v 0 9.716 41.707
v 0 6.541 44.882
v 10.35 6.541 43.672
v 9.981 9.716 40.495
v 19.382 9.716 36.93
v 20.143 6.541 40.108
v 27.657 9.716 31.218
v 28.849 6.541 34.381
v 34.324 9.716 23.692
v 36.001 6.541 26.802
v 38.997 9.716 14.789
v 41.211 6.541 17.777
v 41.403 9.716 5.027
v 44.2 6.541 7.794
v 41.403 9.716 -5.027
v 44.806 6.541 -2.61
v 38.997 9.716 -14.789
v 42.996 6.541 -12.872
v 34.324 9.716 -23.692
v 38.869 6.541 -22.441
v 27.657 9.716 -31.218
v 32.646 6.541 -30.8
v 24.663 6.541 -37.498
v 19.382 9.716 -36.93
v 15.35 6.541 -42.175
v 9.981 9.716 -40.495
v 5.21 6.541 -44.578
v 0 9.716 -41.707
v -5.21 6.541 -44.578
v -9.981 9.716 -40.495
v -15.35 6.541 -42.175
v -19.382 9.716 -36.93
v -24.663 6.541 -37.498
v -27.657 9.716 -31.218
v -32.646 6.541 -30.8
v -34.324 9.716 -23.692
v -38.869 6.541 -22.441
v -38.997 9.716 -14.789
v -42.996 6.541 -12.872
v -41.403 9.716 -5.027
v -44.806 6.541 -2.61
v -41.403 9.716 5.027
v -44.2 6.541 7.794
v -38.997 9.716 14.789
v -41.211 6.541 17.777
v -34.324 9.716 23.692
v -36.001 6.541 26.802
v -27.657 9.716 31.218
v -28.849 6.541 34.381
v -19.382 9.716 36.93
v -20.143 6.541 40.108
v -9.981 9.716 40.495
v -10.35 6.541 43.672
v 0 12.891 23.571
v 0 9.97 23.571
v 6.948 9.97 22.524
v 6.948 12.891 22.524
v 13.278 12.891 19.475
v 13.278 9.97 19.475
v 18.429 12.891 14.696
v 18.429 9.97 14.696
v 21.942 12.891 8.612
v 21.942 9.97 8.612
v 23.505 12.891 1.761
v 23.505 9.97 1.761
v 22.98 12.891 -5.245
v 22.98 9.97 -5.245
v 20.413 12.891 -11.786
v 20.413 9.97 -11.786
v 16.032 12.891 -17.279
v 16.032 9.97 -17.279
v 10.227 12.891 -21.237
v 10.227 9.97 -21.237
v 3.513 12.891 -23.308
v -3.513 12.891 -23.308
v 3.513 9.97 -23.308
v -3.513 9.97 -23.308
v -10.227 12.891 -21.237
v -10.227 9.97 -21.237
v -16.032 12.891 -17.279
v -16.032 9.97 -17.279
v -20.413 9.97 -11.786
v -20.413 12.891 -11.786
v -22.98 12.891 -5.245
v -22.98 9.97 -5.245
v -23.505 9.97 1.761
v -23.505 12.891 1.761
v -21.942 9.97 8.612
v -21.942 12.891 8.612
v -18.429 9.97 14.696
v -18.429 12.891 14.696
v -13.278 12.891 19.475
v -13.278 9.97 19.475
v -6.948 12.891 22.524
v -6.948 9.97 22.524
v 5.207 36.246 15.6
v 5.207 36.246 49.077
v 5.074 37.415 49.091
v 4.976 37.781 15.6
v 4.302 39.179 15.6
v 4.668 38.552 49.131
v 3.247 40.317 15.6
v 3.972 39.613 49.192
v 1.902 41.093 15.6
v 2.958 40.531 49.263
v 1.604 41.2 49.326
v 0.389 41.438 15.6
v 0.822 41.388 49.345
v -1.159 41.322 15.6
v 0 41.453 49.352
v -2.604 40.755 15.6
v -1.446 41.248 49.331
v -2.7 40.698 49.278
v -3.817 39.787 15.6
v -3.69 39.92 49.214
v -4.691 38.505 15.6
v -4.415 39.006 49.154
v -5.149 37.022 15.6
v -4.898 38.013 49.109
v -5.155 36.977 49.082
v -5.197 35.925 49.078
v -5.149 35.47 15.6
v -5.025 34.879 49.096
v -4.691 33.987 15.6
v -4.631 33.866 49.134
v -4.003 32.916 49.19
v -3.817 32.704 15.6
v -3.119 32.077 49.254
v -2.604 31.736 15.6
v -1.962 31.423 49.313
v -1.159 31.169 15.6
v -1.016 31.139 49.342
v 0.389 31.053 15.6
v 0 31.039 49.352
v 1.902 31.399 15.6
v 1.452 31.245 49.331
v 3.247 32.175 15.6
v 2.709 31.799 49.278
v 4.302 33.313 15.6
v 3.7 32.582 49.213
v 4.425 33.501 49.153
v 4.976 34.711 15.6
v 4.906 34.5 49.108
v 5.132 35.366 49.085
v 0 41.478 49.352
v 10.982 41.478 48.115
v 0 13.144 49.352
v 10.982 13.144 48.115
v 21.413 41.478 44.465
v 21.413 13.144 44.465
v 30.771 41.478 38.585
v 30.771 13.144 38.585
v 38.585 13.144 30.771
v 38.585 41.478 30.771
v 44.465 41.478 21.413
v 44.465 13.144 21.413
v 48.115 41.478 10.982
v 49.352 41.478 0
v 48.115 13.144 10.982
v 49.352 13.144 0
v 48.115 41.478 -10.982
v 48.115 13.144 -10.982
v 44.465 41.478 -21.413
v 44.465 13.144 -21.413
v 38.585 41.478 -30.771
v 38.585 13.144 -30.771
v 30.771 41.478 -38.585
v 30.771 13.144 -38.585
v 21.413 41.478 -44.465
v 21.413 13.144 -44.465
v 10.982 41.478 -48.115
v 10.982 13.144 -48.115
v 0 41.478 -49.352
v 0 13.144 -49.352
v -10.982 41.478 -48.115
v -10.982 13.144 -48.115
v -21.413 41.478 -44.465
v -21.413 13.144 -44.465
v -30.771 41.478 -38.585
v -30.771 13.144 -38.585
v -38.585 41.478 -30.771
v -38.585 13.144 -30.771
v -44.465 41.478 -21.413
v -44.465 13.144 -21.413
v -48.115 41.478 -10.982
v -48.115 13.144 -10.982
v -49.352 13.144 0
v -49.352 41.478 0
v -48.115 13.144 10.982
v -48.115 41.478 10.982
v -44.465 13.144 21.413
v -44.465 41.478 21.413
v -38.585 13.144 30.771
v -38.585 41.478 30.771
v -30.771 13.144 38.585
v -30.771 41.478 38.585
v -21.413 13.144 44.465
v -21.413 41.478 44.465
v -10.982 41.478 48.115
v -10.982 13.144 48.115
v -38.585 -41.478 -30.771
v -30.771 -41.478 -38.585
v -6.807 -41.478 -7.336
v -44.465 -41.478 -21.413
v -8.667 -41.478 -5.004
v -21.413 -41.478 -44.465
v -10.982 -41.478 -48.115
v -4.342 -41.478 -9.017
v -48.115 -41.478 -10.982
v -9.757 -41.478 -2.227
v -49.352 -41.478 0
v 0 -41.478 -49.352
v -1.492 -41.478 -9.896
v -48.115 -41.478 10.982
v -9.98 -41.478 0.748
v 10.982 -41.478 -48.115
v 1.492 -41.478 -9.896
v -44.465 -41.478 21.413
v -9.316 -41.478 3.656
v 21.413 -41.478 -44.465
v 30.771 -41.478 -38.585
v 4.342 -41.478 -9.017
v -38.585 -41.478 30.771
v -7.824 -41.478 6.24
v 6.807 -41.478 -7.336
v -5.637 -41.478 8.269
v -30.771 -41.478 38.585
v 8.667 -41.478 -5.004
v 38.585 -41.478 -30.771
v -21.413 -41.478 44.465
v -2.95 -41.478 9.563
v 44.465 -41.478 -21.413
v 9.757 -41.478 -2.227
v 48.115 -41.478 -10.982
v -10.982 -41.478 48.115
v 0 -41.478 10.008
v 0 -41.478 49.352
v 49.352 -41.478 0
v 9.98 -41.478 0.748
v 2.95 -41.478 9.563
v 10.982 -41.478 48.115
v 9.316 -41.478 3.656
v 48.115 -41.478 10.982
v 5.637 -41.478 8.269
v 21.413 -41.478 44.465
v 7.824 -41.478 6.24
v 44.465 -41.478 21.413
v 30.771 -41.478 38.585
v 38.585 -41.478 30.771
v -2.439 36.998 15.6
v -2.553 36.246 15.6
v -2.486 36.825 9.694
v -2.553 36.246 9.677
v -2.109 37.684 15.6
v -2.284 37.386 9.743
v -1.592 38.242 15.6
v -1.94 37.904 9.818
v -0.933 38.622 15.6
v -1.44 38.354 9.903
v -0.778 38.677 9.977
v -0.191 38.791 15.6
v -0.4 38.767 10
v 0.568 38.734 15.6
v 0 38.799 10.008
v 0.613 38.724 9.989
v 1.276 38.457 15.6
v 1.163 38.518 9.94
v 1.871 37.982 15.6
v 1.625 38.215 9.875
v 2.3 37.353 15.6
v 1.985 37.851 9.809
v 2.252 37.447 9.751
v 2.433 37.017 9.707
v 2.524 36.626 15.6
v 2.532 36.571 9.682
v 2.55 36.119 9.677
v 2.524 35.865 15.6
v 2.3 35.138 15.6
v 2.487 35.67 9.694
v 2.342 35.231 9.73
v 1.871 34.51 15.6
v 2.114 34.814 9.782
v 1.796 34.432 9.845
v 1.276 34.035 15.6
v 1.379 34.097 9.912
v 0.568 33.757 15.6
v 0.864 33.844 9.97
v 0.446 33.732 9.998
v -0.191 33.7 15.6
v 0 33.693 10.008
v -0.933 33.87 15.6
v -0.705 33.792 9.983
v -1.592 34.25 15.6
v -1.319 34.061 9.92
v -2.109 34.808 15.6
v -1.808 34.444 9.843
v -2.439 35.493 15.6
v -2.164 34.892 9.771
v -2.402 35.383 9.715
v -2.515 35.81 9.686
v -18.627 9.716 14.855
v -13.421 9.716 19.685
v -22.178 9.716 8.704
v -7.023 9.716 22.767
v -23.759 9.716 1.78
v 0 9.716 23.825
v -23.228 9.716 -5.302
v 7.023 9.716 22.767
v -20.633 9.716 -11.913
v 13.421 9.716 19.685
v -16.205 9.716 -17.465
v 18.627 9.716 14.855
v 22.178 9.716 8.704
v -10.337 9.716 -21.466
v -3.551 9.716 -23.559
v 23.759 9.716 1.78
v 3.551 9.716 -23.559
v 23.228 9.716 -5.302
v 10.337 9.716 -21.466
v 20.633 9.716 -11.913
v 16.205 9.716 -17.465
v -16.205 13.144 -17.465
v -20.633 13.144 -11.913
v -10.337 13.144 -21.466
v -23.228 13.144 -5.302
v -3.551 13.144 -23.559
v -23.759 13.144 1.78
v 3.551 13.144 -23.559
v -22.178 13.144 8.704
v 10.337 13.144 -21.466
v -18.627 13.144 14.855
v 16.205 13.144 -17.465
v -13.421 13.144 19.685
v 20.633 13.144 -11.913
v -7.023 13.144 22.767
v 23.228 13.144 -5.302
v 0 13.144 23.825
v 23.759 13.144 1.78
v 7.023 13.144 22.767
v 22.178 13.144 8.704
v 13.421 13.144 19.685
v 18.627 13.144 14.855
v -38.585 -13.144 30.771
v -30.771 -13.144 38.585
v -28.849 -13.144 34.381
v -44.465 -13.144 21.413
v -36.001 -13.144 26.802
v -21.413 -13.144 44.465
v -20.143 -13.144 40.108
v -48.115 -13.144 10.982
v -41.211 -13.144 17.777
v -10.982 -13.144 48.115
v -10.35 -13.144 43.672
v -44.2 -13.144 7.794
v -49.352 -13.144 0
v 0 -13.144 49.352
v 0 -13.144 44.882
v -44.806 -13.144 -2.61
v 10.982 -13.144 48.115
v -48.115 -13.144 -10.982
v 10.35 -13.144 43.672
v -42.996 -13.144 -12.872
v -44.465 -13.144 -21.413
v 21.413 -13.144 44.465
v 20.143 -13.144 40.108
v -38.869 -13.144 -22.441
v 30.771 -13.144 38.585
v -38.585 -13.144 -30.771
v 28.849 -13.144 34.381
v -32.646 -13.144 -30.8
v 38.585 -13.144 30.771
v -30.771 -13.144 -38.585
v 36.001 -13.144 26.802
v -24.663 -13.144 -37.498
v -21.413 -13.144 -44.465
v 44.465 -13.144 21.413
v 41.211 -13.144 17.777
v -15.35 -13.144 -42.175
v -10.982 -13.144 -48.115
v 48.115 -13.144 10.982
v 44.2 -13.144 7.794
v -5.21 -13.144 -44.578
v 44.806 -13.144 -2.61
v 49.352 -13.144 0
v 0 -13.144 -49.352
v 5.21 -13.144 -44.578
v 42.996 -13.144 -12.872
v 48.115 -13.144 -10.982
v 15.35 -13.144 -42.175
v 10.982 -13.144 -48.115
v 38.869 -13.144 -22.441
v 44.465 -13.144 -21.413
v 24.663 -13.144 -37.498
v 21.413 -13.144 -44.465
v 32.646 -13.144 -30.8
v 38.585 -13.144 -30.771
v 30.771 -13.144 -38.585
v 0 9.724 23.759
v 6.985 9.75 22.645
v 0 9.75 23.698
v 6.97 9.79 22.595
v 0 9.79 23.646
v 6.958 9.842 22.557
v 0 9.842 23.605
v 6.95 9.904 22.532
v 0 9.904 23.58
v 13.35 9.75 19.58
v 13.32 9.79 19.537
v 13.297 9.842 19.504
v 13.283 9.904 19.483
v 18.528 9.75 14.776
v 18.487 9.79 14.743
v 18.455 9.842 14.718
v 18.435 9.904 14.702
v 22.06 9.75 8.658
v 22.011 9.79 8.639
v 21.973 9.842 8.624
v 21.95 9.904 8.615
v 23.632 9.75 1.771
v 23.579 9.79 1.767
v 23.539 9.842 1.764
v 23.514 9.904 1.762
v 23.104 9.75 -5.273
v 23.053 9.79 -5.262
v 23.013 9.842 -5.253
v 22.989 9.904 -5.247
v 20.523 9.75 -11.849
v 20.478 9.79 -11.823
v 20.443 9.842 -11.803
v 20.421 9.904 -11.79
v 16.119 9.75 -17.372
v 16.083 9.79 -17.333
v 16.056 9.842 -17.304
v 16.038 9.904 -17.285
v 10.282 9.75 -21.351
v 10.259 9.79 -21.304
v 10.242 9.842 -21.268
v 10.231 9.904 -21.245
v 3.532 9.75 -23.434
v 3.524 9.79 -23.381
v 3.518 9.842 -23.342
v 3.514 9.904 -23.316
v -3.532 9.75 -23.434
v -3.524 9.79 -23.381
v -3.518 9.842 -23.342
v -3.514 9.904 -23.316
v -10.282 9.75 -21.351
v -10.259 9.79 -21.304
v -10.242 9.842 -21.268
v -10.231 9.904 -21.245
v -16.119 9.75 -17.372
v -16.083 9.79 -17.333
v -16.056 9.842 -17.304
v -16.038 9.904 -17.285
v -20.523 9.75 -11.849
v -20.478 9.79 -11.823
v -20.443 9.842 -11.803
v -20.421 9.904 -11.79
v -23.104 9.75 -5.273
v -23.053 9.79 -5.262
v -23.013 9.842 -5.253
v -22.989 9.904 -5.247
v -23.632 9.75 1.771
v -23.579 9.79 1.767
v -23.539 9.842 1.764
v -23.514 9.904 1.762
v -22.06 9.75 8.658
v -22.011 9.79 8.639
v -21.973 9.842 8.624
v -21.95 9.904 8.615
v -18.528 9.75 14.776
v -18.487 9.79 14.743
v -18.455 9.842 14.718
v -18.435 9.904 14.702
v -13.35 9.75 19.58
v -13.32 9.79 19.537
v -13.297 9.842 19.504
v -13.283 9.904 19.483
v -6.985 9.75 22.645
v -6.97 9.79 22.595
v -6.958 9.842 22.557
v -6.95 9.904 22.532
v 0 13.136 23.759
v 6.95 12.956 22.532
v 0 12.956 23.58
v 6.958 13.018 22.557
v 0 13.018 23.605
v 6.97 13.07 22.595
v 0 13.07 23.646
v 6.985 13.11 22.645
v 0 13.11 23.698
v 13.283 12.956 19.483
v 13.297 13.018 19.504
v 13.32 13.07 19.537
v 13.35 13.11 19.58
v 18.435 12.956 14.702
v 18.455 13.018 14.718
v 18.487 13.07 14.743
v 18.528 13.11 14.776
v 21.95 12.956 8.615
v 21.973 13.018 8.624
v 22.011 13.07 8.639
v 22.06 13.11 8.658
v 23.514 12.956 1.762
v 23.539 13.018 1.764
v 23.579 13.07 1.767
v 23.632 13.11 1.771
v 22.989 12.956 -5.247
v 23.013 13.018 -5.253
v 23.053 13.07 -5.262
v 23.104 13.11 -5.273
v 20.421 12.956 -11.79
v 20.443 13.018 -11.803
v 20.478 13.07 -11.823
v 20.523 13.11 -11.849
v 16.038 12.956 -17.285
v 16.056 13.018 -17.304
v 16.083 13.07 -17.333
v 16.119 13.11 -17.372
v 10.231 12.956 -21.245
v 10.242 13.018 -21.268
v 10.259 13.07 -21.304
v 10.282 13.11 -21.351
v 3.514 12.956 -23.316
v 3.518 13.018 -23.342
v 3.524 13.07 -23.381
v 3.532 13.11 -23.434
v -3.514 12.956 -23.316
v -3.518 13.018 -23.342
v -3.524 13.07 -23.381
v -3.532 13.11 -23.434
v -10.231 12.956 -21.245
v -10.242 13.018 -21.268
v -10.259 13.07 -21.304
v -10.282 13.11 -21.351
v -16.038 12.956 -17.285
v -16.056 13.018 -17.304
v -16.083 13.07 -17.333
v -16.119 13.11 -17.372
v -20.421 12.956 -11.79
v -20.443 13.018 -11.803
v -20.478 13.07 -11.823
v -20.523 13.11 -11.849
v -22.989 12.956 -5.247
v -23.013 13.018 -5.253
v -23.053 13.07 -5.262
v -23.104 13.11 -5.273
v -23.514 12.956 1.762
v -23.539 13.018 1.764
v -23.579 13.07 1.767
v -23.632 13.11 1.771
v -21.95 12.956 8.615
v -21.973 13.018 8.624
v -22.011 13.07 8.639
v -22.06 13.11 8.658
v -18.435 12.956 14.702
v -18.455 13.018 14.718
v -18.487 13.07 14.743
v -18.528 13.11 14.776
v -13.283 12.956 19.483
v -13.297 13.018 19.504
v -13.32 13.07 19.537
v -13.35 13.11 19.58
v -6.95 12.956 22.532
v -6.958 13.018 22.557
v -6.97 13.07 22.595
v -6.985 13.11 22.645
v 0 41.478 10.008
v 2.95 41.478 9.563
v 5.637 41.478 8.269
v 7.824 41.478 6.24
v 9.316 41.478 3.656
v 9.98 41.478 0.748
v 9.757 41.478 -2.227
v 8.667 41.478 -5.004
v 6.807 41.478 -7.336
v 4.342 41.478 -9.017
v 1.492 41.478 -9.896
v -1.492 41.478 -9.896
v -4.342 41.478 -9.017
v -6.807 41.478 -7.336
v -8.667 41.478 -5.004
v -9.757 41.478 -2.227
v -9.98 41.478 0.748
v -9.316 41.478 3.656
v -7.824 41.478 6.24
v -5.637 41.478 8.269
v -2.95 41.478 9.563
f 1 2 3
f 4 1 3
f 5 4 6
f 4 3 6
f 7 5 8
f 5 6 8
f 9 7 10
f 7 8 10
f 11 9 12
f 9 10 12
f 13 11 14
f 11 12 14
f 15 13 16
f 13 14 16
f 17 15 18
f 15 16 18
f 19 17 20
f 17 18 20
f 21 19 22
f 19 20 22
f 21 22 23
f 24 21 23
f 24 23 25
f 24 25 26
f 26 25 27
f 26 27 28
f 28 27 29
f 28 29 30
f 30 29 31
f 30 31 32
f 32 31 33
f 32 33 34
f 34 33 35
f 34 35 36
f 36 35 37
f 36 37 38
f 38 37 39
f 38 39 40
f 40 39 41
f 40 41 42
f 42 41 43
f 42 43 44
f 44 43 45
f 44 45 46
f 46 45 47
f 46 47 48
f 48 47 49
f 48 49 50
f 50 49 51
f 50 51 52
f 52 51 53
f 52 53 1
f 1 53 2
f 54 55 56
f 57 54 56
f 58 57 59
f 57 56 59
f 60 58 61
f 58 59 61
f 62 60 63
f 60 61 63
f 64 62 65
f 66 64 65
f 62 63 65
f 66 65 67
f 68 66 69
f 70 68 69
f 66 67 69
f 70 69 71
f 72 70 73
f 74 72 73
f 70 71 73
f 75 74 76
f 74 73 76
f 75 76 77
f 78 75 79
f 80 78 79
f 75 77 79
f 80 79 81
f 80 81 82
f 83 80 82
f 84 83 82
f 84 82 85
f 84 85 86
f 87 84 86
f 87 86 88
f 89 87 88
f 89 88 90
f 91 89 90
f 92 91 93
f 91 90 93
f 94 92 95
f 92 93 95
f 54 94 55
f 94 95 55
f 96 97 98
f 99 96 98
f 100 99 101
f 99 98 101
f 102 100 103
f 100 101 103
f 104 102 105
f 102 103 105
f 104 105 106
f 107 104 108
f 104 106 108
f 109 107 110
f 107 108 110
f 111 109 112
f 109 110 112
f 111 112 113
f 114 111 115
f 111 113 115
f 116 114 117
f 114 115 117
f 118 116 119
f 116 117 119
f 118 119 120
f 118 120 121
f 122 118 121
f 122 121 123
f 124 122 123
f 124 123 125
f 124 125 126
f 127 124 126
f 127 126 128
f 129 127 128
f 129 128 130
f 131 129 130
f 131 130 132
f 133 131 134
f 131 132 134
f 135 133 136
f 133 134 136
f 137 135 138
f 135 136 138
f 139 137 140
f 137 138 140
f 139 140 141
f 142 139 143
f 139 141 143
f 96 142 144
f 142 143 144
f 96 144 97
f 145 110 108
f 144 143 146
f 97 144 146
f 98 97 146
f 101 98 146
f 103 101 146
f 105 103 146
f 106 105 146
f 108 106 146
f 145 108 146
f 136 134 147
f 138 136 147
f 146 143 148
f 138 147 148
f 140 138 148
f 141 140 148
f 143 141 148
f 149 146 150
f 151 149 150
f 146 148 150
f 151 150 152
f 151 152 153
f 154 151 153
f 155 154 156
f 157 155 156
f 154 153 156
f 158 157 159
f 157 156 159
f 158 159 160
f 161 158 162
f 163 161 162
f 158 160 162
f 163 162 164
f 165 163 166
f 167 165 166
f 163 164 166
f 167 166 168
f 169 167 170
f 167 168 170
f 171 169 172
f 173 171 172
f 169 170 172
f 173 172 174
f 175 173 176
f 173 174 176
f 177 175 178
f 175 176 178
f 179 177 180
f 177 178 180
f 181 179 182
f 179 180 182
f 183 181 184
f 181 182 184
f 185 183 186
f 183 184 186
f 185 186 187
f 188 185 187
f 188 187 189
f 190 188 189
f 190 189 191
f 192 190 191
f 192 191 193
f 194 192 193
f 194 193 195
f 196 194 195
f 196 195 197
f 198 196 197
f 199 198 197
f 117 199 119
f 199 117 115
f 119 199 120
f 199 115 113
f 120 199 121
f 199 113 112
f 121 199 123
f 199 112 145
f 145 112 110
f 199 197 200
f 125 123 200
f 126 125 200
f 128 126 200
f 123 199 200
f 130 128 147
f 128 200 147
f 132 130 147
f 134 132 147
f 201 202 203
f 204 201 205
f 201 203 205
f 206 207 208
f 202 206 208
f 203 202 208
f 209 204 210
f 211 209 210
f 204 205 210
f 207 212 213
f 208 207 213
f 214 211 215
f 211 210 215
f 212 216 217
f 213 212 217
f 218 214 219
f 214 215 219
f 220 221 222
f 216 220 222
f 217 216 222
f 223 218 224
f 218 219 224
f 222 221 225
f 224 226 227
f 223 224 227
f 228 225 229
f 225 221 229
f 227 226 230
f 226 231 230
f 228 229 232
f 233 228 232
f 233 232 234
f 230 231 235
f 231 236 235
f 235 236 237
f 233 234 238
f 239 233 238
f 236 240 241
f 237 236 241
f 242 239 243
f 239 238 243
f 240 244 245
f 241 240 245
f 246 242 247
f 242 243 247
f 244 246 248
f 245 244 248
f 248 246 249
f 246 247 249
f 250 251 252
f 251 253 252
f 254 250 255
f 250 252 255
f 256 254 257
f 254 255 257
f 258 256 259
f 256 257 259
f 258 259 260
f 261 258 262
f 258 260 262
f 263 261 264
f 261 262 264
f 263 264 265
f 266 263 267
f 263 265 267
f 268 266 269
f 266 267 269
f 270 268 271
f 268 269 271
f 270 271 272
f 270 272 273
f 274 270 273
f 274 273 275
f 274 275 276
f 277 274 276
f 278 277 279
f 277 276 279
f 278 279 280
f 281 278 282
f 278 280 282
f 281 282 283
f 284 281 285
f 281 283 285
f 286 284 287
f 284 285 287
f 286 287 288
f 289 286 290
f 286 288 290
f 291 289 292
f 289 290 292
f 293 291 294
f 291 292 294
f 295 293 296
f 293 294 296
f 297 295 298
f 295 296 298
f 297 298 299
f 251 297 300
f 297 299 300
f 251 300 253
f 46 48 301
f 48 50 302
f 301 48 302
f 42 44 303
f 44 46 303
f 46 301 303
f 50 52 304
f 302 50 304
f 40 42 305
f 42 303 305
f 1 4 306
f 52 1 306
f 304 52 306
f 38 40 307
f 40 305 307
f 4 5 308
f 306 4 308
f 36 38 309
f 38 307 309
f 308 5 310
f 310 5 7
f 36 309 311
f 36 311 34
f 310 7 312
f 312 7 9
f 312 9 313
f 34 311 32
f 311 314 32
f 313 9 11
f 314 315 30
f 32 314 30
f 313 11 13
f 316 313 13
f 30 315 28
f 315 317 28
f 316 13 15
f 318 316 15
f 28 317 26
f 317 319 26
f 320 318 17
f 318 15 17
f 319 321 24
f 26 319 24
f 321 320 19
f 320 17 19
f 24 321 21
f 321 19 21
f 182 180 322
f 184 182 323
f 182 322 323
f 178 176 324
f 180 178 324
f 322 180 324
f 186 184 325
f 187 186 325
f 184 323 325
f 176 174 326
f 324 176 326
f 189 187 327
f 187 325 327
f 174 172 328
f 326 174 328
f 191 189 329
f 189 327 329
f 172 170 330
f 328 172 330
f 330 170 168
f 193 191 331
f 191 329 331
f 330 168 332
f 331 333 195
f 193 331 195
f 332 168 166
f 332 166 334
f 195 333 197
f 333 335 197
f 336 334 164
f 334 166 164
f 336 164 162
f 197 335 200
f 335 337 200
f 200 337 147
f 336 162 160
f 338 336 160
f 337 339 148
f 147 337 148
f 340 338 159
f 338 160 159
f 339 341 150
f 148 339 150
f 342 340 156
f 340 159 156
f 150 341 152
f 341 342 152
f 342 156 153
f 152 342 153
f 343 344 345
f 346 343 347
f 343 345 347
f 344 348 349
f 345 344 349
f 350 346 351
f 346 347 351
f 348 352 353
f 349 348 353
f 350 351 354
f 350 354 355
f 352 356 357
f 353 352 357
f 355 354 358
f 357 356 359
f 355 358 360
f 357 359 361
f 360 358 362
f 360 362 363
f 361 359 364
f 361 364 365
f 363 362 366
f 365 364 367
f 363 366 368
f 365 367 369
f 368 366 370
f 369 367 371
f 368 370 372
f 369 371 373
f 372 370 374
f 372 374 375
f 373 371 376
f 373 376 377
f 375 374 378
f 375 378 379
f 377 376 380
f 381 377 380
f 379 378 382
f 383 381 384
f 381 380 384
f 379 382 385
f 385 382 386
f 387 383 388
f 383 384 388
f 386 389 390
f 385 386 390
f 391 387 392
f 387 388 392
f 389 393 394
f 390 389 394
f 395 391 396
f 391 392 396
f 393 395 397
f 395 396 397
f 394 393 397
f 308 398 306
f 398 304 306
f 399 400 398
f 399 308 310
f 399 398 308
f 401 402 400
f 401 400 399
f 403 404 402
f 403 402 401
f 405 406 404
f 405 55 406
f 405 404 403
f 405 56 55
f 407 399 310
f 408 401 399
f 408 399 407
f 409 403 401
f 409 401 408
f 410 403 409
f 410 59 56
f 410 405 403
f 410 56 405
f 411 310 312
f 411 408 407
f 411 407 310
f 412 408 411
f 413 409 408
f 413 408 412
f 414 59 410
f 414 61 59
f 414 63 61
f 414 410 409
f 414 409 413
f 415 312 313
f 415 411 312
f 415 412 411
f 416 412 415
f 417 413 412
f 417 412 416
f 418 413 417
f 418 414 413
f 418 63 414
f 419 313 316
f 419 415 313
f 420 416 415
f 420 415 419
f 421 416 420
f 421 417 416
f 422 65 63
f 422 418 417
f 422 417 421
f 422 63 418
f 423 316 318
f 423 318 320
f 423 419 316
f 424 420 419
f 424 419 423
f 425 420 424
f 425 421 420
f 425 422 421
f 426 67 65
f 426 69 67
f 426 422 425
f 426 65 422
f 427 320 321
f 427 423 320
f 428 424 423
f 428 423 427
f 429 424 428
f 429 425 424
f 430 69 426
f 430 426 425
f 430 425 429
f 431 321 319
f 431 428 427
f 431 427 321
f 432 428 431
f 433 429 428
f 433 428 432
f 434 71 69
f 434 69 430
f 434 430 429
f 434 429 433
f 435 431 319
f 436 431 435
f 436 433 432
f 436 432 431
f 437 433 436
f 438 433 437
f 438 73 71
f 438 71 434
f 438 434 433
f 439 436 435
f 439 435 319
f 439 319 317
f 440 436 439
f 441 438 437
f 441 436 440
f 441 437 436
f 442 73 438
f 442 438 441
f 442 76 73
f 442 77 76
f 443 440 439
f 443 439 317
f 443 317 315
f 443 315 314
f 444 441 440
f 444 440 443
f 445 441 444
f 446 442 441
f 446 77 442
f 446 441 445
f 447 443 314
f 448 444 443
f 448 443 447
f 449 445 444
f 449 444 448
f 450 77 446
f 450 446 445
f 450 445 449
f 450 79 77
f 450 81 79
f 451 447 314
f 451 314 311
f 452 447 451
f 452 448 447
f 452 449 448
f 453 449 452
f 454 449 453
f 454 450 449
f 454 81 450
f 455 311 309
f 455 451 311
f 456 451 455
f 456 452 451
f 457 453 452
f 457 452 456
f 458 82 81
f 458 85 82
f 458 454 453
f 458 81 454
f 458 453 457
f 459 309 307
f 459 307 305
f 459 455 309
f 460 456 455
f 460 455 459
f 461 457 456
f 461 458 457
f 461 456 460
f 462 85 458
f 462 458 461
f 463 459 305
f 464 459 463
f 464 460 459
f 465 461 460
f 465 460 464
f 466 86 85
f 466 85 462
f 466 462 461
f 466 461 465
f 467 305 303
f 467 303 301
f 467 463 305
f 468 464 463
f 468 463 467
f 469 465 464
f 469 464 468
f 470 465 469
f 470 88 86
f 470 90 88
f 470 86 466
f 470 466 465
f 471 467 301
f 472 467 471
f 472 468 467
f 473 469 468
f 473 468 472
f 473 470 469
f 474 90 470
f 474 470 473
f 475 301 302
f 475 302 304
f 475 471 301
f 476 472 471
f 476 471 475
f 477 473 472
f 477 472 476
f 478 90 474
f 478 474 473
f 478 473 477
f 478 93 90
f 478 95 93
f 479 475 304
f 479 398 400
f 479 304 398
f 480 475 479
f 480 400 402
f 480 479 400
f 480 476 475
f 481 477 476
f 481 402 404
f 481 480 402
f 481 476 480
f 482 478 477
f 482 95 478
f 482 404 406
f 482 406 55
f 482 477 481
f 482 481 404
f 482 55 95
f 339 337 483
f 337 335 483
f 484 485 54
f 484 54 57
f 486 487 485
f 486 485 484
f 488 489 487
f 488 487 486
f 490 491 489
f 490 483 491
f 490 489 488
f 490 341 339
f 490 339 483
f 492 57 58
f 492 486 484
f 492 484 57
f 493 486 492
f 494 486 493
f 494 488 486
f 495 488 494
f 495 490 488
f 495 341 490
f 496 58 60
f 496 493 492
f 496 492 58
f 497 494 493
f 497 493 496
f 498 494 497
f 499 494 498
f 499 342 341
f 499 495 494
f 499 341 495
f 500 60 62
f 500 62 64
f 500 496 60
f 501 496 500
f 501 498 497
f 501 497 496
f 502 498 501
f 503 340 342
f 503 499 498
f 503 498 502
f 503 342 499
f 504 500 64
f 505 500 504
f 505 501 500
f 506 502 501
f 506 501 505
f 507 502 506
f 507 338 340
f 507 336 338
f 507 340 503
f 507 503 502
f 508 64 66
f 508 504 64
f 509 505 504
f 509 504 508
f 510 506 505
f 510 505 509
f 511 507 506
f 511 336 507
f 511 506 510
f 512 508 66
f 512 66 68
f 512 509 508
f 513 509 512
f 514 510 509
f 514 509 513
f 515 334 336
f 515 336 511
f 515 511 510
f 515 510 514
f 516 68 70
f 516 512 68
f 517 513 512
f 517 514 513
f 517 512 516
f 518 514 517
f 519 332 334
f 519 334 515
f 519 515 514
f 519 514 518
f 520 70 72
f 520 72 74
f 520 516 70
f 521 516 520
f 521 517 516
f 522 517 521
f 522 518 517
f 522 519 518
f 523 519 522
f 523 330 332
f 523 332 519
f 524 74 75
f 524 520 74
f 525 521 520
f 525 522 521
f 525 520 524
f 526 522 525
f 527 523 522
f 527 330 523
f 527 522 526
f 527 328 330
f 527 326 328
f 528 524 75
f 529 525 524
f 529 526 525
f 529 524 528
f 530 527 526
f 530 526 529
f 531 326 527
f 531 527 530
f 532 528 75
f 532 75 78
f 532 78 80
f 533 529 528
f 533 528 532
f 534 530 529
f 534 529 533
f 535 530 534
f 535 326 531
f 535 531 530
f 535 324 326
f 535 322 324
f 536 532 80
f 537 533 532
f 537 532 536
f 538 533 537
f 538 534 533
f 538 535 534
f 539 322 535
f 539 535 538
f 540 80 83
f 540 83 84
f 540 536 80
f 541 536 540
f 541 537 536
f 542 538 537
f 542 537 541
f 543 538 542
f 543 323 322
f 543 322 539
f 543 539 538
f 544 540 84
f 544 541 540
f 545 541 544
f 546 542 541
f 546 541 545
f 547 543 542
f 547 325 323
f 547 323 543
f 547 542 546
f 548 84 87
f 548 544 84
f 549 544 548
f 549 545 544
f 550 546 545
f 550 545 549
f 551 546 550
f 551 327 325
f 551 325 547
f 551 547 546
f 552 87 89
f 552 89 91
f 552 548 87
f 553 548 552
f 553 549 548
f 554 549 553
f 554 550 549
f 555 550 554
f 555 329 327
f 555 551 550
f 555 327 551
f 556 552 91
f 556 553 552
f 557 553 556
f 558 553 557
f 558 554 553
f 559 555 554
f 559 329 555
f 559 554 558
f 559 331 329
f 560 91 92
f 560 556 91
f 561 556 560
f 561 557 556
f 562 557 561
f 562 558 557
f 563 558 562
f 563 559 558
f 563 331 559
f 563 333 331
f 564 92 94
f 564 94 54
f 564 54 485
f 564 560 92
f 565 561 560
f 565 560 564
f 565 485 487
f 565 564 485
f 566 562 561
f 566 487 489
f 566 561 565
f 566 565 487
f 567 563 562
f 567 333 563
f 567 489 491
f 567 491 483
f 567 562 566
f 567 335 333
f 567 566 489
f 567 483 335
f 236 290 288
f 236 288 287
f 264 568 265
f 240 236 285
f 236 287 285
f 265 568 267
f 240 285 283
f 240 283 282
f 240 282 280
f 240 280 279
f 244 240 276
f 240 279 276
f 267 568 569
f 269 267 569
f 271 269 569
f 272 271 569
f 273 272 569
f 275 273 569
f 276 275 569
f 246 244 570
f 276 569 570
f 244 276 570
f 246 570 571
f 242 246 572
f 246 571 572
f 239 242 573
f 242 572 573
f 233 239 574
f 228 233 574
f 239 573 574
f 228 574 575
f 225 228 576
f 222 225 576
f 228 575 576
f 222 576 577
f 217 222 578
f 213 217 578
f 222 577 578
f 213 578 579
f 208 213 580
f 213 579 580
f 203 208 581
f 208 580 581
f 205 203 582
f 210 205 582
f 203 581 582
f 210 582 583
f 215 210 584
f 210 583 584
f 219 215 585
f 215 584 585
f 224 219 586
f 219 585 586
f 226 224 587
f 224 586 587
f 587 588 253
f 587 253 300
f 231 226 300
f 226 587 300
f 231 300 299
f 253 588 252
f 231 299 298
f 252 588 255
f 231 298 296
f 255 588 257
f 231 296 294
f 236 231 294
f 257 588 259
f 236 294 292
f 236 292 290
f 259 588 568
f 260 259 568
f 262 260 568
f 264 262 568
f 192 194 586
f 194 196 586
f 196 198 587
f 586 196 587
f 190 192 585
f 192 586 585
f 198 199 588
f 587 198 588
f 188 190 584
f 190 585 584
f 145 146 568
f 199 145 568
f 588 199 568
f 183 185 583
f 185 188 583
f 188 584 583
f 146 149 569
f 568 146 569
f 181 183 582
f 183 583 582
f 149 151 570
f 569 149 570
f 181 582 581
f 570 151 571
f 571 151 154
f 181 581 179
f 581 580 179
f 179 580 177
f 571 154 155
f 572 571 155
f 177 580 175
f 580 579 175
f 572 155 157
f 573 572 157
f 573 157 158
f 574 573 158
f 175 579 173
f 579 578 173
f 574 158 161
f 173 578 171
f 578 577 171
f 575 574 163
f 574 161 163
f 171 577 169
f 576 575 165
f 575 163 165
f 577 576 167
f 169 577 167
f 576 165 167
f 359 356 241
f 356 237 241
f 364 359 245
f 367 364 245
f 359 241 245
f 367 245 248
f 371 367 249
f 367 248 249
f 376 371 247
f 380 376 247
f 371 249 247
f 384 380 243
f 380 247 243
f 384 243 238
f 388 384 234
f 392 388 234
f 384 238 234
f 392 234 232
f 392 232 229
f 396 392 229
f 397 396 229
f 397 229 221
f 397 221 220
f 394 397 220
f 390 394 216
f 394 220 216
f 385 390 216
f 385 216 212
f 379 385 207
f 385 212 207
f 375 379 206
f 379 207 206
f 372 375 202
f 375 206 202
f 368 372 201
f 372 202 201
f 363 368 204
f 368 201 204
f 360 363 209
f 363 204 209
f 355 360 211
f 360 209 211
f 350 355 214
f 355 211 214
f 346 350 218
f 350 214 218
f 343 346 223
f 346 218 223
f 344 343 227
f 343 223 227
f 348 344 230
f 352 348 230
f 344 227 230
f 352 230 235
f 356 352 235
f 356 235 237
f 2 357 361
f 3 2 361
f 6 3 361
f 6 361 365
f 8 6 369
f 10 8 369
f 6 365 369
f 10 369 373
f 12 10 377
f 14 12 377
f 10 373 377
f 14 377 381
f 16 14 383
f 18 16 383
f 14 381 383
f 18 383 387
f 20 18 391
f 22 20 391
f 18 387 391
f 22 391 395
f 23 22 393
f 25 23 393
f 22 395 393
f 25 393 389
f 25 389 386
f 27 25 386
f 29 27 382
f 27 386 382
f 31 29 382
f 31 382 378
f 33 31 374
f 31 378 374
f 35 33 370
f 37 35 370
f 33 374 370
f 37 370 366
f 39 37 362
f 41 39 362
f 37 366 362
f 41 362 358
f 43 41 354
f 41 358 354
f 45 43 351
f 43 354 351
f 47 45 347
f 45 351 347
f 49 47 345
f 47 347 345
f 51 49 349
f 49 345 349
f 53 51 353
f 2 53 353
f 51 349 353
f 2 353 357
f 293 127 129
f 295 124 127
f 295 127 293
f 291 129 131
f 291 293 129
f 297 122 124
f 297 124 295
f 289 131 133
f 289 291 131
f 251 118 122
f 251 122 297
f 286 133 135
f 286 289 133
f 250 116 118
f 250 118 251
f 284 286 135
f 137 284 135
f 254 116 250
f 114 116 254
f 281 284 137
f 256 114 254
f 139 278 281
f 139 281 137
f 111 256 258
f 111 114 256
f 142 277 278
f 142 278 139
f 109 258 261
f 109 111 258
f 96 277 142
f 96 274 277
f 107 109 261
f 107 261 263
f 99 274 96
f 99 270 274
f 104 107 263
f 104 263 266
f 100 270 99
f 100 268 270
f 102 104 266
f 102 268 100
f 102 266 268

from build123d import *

# Parameters (mm, degrees)
F2_SIZE        = 3.175
F3_R           = 0.254
F6_D           = 5.1054
F6_DEPTH       = 49.3522
F6_START       = 0.2754562
F6_CBORE_D     = 10.414
F6_CBORE_DEPTH = 33.4772
F6_TIP         = 1.5338169022


# Not quite as in the source:
# - a feature names something its author has since deleted; it is built from what else it names


with BuildPart() as f1:
    # F0 (on Right) → F1 (revolve)
    with BuildSketch(Plane.YZ):
        Polygon((-41.4782, 10.0076), (0, 10.0076), (41.4782, 10.0076), (41.4782, 49.3522), (13.1445, 49.3522), (13.1445, 23.5712), (9.7155, 23.5712), (9.7155, 44.8818), (-13.1445, 44.8818), (-13.1445, 49.3522), (-41.4782, 49.3522), align=None)
    revolve(axis=Axis((0, -0.9843776588, 0), (0, 1, 0)))

    # F2
    f2_edges = [f1.edges().sort_by_distance(p)[0] for p in [
        (0, 9.7155, -44.8818),
    ]]
    chamfer(f2_edges, length=F2_SIZE)

    # F3
    f3_edges = [f1.edges().sort_by_distance(p)[0] for p in [
        (0, 9.7155, -23.5712),
        (0, 13.1445, -23.5712),
    ]]
    fillet(f3_edges, radius=F3_R)

    # F6
    # its depths count from where the whole tool has entered the part; down to there all is cleared
    with Locations(Plane.XY.offset(49.3522).offset(-F6_START)):
        with Locations((0, 36.2458)):
            CounterBoreHole(F6_D / 2, F6_CBORE_D / 2, F6_CBORE_DEPTH, depth=F6_DEPTH)
            with Locations((0, 0, -(F6_DEPTH + F6_TIP / 2))):  # 118° drill point
                Cone(0, F6_D / 2, F6_TIP, mode=Mode.SUBTRACT)


solid = f1.part
